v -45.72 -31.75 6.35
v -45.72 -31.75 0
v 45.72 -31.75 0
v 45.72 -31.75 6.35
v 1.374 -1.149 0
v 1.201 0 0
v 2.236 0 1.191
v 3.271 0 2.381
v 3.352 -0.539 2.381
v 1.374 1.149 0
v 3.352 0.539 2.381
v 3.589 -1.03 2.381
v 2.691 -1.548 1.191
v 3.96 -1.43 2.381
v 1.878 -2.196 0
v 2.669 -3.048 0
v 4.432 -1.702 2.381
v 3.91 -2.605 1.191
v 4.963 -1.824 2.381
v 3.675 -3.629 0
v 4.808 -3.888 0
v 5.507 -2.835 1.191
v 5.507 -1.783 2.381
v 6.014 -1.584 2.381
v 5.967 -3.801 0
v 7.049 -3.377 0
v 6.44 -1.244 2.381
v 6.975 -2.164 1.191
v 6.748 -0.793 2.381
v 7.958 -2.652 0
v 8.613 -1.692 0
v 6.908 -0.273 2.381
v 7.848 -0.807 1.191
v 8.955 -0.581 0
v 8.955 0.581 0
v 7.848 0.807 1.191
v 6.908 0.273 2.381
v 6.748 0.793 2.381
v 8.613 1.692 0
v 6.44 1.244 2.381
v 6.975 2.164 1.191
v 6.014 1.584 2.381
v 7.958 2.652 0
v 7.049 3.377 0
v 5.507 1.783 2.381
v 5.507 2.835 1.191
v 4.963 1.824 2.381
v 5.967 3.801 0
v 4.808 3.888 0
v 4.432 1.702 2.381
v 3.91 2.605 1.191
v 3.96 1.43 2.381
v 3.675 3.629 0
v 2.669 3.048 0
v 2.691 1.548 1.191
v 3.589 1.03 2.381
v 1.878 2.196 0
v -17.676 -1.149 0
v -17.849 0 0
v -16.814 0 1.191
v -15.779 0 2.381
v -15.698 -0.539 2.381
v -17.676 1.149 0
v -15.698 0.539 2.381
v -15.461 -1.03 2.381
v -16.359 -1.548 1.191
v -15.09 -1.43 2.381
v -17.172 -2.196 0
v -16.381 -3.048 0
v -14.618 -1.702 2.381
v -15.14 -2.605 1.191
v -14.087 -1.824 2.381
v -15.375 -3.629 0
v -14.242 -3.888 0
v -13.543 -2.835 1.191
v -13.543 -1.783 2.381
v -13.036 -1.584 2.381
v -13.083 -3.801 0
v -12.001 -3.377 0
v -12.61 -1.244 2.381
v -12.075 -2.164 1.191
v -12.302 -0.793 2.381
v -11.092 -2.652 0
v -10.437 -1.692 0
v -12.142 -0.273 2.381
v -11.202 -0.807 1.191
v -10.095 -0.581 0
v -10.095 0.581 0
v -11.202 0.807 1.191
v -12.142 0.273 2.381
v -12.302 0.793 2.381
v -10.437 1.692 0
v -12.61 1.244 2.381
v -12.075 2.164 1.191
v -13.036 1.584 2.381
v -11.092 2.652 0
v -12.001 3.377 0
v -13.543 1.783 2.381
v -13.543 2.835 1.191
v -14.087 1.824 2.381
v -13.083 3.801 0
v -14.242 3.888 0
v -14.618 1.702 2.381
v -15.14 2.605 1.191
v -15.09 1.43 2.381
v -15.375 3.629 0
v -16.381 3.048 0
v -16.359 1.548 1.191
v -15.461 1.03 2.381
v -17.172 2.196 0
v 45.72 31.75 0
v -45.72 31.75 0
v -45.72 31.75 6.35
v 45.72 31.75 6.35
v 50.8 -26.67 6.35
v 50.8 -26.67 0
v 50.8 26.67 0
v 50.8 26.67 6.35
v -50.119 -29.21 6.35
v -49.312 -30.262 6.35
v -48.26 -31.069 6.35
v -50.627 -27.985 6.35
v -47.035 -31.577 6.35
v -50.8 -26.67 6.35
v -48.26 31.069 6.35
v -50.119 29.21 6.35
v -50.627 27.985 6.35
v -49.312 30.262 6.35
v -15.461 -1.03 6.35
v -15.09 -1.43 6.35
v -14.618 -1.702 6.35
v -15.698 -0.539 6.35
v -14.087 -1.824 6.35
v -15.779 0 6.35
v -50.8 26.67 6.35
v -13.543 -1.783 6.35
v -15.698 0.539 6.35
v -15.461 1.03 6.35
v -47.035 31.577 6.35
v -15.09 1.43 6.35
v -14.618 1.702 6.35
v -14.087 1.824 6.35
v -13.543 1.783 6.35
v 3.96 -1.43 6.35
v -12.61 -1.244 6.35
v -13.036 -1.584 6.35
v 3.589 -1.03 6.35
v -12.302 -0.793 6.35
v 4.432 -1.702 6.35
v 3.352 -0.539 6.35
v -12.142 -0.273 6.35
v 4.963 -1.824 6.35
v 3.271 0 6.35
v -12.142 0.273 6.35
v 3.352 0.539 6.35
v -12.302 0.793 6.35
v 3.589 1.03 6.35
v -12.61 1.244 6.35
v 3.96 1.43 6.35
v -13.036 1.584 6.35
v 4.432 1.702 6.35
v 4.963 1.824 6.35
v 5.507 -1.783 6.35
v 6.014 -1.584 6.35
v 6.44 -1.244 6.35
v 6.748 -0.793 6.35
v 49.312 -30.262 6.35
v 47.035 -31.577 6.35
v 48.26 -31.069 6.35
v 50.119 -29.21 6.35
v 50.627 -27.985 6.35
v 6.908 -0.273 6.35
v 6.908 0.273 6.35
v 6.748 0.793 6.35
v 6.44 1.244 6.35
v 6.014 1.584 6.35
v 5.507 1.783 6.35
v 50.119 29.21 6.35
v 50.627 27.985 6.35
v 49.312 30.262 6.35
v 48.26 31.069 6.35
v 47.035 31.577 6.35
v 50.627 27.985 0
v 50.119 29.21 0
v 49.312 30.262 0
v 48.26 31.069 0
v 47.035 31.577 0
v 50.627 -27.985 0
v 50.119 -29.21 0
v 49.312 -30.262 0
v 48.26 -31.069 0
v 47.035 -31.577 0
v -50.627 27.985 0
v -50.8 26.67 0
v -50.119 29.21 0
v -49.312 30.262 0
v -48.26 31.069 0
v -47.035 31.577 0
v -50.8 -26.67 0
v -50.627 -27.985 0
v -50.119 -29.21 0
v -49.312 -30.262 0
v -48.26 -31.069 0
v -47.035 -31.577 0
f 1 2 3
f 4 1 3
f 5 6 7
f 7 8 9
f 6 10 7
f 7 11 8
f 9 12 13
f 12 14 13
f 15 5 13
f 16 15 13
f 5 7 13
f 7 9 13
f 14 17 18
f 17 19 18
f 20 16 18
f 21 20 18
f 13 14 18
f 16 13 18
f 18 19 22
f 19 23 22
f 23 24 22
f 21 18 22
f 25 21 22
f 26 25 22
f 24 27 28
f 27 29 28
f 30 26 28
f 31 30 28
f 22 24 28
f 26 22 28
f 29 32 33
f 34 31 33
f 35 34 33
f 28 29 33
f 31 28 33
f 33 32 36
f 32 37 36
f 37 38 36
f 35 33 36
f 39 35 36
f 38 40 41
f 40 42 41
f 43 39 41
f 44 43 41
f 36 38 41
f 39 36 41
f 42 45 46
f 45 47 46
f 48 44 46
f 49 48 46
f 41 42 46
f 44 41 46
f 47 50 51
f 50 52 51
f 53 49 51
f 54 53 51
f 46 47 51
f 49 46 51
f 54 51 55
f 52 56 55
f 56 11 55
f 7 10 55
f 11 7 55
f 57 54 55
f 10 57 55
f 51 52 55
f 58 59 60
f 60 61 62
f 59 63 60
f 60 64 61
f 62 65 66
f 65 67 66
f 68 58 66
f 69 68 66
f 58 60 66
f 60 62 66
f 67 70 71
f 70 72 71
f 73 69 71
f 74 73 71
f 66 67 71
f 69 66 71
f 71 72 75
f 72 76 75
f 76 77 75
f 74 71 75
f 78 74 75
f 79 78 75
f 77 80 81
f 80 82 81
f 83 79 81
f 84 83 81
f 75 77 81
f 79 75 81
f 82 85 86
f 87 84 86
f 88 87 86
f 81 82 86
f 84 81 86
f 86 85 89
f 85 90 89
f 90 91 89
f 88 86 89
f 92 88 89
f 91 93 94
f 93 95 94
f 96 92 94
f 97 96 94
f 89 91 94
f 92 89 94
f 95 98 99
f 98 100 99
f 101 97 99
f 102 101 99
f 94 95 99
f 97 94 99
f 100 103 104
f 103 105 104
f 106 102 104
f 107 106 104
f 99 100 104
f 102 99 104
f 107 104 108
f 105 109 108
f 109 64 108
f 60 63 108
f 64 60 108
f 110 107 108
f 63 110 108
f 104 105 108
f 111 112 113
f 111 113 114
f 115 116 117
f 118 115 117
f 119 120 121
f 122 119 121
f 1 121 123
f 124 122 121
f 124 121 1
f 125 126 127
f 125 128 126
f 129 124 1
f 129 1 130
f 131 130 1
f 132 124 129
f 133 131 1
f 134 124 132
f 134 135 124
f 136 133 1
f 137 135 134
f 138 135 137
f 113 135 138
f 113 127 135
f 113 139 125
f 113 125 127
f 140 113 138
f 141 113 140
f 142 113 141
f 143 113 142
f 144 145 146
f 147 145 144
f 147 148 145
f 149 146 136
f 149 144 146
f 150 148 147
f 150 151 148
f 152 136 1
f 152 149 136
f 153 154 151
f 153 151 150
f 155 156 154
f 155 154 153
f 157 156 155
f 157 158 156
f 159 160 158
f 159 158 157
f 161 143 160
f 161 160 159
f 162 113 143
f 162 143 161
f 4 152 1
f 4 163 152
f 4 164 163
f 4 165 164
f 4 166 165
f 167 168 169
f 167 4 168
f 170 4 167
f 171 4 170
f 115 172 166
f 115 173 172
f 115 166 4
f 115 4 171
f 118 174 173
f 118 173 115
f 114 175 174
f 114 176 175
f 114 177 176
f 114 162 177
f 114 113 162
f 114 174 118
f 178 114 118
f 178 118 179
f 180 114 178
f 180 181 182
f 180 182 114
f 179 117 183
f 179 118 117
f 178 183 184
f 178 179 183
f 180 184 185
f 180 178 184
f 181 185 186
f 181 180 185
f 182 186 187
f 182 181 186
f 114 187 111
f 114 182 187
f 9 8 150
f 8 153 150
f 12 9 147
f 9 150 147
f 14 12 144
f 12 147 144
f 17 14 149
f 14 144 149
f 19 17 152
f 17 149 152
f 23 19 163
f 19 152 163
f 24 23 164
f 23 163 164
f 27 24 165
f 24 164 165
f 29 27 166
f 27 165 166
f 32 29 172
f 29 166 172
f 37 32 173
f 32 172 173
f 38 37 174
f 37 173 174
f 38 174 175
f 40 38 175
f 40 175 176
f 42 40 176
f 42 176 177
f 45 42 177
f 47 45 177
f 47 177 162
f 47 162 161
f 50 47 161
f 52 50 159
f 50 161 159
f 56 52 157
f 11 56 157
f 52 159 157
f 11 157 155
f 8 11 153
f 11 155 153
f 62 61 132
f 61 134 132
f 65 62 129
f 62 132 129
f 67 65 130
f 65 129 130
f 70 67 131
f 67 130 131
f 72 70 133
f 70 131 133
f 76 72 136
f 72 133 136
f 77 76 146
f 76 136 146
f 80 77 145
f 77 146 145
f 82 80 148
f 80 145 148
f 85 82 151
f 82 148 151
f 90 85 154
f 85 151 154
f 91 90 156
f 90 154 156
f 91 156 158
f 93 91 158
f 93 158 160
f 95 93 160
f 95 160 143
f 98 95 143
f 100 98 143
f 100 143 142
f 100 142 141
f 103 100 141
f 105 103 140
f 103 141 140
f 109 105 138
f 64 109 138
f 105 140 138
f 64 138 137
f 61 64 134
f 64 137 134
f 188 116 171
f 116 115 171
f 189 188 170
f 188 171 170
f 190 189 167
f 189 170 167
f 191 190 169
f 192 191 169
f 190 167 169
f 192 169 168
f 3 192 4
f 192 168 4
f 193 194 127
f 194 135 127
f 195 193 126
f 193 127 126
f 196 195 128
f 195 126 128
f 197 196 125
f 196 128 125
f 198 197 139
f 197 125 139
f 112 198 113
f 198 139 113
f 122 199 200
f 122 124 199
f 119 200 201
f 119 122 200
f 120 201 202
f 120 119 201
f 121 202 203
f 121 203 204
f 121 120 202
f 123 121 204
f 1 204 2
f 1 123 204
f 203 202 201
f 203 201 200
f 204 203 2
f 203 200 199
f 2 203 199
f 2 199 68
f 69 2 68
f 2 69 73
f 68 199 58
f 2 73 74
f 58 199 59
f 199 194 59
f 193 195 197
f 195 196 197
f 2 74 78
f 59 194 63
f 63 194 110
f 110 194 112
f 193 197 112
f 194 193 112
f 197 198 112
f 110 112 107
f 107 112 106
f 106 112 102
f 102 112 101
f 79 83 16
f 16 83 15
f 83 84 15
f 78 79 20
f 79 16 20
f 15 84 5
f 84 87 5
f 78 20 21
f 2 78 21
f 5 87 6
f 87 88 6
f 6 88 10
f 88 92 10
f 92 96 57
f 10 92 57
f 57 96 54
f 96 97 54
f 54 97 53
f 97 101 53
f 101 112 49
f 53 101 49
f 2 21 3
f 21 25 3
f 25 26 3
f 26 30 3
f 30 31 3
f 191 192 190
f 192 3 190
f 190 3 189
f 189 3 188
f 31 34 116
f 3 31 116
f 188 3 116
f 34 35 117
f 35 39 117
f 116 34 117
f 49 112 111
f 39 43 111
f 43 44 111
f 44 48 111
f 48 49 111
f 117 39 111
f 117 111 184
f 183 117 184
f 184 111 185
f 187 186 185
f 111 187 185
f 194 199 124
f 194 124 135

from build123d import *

# Parameters (mm, degrees)
F0_W           = 101.6
F0_H           = 63.5
F1_DEPTH       = 6.35
F2_D           = 3.6576
F2_CSINK_D     = 7.7978
F2_CSINK_ANGLE = 82
F3_R           = 5.08


with BuildPart() as f1:
    # F0 (on Top) → F1 (new body)
    with BuildSketch(Plane.XY):
        Rectangle(F0_W, F0_H)
    extrude(amount=F1_DEPTH)

    # F2 (through all)
    with Locations(Plane(origin=(0, 0, 0), x_dir=(1, 0, 0), z_dir=(0, 0, -1))):
        with Locations((-13.9501372, 0), (5.0998628, 0)):
            CounterSinkHole(F2_D / 2, F2_CSINK_D / 2, counter_sink_angle=F2_CSINK_ANGLE)

    # F3
    f3_edges = [f1.edges().sort_by_distance(p)[0] for p in [
        (-50.8, -31.75, 3.175),
        (-50.8, 31.75, 3.175),
        (50.8, -31.75, 3.175),
        (50.8, 31.75, 3.175),
    ]]
    fillet(f3_edges, radius=F3_R)


solid = f1.part
